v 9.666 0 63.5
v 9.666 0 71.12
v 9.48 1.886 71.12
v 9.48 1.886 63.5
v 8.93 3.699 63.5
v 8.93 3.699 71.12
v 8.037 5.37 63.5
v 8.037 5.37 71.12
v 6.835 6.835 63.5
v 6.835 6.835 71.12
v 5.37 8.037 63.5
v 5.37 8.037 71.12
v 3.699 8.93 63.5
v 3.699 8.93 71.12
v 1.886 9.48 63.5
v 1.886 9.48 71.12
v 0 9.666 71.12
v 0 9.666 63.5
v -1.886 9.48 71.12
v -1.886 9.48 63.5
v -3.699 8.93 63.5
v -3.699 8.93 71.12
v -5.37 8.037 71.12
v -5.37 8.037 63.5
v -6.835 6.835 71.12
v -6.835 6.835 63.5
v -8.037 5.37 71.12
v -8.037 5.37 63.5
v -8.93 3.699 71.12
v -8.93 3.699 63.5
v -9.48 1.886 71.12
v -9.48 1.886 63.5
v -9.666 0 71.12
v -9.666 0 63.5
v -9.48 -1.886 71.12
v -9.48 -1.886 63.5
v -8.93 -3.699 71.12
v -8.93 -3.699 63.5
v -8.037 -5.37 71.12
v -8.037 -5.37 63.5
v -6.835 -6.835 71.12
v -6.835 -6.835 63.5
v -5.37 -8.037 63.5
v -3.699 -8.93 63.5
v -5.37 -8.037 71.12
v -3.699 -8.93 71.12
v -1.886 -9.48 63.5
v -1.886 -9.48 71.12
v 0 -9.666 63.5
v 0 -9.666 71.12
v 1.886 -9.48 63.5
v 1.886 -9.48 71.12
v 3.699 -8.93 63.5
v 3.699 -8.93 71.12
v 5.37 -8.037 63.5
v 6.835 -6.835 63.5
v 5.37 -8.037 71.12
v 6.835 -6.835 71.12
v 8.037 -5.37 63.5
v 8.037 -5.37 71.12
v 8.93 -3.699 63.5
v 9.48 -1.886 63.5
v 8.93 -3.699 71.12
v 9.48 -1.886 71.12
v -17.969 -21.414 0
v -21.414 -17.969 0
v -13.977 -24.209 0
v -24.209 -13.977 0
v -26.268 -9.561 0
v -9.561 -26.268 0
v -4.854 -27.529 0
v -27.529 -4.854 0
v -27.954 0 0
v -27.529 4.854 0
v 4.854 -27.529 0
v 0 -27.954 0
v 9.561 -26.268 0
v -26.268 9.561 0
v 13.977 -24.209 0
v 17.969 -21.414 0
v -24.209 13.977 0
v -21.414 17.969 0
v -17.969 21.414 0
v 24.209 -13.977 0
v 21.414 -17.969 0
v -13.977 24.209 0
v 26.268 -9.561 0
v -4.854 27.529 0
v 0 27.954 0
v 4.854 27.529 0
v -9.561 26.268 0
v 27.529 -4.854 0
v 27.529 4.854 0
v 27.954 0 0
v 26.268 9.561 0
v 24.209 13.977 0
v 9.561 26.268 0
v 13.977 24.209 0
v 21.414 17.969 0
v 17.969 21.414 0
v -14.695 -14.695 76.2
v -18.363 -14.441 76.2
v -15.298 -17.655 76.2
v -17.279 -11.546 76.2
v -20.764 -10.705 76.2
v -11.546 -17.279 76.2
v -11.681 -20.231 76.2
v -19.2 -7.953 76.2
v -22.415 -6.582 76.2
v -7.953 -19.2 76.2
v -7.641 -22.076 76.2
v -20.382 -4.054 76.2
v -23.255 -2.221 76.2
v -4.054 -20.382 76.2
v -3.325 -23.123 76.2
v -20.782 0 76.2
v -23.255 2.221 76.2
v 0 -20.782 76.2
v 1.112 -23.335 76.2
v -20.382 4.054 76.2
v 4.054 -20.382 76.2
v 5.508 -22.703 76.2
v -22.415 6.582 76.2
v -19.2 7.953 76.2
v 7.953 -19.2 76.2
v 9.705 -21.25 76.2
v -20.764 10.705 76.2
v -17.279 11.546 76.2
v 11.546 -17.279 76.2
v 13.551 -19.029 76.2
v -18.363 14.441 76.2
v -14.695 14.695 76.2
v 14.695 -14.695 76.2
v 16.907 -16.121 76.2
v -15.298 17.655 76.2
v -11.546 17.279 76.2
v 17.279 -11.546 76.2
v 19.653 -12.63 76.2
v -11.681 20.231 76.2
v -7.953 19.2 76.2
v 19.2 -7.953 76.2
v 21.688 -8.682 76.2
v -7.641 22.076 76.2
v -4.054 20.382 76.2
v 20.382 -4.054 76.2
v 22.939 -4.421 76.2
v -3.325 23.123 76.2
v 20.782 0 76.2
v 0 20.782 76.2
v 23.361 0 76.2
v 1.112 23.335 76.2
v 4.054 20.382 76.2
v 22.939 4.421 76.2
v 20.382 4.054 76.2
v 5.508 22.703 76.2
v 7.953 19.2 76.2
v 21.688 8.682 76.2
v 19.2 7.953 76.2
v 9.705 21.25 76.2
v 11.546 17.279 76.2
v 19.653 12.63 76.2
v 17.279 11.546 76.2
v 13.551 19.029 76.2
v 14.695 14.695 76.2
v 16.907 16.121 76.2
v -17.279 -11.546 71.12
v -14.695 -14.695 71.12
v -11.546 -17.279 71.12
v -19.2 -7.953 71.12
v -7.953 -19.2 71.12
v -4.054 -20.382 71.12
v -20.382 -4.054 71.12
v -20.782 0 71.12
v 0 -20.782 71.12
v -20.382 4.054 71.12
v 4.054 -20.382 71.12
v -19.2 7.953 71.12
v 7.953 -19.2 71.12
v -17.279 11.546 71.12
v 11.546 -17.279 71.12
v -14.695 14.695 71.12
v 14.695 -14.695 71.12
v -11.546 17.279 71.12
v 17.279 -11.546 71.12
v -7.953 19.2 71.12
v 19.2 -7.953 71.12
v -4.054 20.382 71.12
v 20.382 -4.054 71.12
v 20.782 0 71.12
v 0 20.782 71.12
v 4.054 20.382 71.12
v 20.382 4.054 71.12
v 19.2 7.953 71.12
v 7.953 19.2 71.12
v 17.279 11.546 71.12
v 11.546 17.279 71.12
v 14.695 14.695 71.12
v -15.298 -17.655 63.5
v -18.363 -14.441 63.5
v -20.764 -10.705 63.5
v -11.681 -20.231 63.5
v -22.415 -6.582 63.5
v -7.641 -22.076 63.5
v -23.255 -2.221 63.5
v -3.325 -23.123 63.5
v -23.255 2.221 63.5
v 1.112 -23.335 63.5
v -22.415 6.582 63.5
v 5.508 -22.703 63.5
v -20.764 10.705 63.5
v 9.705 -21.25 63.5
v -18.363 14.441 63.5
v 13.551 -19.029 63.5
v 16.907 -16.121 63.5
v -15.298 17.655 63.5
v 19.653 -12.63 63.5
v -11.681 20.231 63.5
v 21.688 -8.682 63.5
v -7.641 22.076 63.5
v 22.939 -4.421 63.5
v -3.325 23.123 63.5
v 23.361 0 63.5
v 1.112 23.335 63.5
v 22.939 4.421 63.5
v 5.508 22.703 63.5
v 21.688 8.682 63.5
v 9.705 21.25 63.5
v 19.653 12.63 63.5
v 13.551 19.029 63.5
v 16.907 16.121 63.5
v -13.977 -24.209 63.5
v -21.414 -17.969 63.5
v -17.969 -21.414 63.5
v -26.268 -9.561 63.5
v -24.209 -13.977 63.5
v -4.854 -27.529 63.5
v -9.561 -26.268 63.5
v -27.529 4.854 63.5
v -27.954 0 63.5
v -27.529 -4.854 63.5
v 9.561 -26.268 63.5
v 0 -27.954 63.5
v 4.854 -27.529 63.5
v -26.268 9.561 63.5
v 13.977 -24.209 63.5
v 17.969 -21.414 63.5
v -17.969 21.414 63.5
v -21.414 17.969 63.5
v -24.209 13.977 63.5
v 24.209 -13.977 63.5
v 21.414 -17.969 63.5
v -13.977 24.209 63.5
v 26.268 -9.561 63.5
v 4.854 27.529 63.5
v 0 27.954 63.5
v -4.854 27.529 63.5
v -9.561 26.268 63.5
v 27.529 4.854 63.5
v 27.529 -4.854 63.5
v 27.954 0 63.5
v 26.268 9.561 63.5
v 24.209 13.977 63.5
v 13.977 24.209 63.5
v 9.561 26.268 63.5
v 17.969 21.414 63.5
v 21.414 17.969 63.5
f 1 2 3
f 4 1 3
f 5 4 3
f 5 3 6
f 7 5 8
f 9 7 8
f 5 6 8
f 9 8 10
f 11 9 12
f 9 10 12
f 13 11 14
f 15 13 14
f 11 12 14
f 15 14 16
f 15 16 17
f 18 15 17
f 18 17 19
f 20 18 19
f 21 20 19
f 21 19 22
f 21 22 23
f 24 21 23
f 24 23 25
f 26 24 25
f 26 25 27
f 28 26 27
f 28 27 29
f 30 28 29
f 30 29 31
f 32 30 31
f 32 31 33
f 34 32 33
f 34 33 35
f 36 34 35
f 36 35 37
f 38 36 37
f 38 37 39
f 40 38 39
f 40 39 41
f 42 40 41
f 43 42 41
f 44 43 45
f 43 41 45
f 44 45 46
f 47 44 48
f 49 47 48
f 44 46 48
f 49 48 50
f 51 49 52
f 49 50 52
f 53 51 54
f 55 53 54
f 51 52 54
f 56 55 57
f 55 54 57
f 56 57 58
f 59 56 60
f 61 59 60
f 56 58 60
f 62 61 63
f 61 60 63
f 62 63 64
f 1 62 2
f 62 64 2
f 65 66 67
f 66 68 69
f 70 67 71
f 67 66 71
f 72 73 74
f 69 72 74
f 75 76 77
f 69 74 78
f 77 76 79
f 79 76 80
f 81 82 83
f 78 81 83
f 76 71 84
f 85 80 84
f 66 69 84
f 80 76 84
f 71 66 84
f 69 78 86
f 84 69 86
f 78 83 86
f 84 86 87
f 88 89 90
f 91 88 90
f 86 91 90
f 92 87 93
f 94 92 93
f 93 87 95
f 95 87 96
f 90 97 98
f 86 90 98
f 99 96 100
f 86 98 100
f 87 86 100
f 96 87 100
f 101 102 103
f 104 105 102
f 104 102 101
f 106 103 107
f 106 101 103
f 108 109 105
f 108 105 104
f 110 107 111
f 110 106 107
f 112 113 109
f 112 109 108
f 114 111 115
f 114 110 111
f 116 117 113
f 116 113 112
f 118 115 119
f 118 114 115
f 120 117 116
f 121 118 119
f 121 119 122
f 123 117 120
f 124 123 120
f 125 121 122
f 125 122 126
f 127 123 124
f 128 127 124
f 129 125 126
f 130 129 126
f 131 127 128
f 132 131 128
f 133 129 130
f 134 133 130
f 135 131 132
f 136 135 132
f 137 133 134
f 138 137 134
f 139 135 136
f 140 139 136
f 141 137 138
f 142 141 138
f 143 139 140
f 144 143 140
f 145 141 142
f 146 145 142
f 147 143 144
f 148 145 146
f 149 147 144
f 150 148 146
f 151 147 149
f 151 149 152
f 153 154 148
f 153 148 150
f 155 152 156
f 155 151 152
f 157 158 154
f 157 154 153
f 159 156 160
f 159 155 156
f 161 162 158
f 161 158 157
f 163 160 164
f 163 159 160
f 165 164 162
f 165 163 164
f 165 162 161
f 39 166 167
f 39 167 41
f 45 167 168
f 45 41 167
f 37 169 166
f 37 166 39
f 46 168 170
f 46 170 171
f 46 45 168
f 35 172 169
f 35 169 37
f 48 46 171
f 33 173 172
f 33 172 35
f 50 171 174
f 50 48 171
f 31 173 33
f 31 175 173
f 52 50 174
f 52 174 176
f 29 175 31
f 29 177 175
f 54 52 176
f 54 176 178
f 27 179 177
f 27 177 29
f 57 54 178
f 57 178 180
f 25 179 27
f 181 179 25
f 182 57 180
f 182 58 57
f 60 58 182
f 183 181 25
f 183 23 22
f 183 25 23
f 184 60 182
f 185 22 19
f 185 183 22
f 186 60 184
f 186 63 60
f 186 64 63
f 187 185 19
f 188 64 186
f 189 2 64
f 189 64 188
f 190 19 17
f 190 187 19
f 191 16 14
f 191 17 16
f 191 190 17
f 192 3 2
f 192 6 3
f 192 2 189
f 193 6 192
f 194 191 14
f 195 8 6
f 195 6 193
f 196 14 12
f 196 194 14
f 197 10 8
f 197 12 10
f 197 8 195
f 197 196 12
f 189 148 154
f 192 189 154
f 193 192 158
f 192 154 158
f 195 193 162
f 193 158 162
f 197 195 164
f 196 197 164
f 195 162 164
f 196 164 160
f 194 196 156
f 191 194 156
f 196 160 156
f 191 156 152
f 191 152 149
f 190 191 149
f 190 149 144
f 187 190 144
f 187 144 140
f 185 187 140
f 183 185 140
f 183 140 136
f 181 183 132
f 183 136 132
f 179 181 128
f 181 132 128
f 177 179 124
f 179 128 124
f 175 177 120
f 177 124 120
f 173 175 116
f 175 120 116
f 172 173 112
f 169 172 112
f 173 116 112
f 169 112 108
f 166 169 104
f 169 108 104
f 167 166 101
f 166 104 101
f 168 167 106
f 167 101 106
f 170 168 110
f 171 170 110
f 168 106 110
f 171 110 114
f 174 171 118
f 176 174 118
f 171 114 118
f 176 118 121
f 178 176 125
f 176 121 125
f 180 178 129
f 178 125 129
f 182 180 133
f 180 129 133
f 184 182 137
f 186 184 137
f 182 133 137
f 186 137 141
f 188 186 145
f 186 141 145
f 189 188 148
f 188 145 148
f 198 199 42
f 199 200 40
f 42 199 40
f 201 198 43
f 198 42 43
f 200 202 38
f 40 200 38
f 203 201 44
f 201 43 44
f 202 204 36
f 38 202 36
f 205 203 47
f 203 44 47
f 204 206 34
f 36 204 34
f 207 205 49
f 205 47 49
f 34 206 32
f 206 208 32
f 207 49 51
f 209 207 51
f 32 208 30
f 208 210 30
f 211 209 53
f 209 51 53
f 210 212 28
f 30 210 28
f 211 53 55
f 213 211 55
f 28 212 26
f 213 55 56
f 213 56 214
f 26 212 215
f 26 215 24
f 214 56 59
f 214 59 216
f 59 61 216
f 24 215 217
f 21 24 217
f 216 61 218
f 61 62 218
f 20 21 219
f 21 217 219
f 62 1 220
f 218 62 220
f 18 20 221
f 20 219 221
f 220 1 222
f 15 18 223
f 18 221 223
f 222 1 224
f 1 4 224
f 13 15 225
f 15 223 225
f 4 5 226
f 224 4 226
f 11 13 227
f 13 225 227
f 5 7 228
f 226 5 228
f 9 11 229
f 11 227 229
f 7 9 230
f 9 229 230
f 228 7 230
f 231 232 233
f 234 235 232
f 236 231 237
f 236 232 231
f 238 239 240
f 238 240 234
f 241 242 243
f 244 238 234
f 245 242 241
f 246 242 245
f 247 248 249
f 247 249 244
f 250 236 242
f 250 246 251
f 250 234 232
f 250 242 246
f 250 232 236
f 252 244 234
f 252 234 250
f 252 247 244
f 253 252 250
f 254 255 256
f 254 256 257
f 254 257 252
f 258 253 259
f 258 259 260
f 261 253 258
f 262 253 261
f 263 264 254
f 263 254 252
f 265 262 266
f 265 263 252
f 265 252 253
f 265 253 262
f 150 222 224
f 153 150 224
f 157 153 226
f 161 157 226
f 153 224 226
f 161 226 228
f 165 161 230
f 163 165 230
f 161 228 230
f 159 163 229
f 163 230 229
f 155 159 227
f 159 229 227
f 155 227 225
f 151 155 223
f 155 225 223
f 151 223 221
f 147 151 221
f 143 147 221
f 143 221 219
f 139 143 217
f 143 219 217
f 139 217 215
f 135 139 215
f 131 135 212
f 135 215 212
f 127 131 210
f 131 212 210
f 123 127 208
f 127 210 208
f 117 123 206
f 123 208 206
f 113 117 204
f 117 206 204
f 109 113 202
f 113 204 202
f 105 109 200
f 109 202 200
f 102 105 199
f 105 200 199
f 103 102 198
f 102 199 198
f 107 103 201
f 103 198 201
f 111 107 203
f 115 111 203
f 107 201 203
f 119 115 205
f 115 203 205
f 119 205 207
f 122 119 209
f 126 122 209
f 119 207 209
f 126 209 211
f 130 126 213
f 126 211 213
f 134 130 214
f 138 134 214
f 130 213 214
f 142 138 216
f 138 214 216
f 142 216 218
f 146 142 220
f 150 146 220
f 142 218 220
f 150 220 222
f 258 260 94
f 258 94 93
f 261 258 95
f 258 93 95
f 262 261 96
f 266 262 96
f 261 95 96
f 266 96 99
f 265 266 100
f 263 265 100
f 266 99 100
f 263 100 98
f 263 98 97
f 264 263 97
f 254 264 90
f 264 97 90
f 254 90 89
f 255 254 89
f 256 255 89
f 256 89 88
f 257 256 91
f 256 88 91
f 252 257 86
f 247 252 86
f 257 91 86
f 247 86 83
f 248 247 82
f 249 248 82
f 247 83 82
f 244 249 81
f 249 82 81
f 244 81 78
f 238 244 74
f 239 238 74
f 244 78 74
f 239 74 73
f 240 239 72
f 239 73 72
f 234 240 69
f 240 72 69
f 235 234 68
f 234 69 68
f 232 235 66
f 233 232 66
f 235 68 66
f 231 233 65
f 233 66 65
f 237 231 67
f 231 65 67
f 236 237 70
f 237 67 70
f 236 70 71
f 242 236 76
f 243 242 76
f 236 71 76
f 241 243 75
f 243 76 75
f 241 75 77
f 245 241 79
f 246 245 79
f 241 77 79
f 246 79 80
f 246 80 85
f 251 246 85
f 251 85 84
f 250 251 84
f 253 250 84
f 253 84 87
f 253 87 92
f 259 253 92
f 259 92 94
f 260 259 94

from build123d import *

# Parameters (mm, degrees)
F0_R     = 27.9540439908
F1_DEPTH = 63.5
F2_R     = 23.3610455133
F3_DEPTH = 12.7
F4_R     = 20.7815529946
F5_DEPTH = 5.08
F6_R     = 9.6661345216
F7_DEPTH = 12.7


with BuildPart() as f1:
    # F0 (on Top) → F1 (new body)
    with BuildSketch(Plane.XY):
        Circle(F0_R)
    extrude(amount=F1_DEPTH)


with BuildPart() as f3:
    # F2 (on face) → F3 (new body)
    with BuildSketch(Plane.XY.offset(63.5)):
        Circle(F2_R)
    extrude(amount=F3_DEPTH)

    # F4 (on face) → F5 (cut)
    with BuildSketch(Plane.XY.offset(76.2)):
        Circle(F4_R)
    extrude(amount=-F5_DEPTH, mode=Mode.SUBTRACT)

    # F6 (on face) → F7 (cut)
    with BuildSketch(Plane.XY.offset(71.12)):
        Circle(F6_R)
    extrude(amount=-F7_DEPTH, mode=Mode.SUBTRACT)


solid = Compound([f1.part, f3.part])
